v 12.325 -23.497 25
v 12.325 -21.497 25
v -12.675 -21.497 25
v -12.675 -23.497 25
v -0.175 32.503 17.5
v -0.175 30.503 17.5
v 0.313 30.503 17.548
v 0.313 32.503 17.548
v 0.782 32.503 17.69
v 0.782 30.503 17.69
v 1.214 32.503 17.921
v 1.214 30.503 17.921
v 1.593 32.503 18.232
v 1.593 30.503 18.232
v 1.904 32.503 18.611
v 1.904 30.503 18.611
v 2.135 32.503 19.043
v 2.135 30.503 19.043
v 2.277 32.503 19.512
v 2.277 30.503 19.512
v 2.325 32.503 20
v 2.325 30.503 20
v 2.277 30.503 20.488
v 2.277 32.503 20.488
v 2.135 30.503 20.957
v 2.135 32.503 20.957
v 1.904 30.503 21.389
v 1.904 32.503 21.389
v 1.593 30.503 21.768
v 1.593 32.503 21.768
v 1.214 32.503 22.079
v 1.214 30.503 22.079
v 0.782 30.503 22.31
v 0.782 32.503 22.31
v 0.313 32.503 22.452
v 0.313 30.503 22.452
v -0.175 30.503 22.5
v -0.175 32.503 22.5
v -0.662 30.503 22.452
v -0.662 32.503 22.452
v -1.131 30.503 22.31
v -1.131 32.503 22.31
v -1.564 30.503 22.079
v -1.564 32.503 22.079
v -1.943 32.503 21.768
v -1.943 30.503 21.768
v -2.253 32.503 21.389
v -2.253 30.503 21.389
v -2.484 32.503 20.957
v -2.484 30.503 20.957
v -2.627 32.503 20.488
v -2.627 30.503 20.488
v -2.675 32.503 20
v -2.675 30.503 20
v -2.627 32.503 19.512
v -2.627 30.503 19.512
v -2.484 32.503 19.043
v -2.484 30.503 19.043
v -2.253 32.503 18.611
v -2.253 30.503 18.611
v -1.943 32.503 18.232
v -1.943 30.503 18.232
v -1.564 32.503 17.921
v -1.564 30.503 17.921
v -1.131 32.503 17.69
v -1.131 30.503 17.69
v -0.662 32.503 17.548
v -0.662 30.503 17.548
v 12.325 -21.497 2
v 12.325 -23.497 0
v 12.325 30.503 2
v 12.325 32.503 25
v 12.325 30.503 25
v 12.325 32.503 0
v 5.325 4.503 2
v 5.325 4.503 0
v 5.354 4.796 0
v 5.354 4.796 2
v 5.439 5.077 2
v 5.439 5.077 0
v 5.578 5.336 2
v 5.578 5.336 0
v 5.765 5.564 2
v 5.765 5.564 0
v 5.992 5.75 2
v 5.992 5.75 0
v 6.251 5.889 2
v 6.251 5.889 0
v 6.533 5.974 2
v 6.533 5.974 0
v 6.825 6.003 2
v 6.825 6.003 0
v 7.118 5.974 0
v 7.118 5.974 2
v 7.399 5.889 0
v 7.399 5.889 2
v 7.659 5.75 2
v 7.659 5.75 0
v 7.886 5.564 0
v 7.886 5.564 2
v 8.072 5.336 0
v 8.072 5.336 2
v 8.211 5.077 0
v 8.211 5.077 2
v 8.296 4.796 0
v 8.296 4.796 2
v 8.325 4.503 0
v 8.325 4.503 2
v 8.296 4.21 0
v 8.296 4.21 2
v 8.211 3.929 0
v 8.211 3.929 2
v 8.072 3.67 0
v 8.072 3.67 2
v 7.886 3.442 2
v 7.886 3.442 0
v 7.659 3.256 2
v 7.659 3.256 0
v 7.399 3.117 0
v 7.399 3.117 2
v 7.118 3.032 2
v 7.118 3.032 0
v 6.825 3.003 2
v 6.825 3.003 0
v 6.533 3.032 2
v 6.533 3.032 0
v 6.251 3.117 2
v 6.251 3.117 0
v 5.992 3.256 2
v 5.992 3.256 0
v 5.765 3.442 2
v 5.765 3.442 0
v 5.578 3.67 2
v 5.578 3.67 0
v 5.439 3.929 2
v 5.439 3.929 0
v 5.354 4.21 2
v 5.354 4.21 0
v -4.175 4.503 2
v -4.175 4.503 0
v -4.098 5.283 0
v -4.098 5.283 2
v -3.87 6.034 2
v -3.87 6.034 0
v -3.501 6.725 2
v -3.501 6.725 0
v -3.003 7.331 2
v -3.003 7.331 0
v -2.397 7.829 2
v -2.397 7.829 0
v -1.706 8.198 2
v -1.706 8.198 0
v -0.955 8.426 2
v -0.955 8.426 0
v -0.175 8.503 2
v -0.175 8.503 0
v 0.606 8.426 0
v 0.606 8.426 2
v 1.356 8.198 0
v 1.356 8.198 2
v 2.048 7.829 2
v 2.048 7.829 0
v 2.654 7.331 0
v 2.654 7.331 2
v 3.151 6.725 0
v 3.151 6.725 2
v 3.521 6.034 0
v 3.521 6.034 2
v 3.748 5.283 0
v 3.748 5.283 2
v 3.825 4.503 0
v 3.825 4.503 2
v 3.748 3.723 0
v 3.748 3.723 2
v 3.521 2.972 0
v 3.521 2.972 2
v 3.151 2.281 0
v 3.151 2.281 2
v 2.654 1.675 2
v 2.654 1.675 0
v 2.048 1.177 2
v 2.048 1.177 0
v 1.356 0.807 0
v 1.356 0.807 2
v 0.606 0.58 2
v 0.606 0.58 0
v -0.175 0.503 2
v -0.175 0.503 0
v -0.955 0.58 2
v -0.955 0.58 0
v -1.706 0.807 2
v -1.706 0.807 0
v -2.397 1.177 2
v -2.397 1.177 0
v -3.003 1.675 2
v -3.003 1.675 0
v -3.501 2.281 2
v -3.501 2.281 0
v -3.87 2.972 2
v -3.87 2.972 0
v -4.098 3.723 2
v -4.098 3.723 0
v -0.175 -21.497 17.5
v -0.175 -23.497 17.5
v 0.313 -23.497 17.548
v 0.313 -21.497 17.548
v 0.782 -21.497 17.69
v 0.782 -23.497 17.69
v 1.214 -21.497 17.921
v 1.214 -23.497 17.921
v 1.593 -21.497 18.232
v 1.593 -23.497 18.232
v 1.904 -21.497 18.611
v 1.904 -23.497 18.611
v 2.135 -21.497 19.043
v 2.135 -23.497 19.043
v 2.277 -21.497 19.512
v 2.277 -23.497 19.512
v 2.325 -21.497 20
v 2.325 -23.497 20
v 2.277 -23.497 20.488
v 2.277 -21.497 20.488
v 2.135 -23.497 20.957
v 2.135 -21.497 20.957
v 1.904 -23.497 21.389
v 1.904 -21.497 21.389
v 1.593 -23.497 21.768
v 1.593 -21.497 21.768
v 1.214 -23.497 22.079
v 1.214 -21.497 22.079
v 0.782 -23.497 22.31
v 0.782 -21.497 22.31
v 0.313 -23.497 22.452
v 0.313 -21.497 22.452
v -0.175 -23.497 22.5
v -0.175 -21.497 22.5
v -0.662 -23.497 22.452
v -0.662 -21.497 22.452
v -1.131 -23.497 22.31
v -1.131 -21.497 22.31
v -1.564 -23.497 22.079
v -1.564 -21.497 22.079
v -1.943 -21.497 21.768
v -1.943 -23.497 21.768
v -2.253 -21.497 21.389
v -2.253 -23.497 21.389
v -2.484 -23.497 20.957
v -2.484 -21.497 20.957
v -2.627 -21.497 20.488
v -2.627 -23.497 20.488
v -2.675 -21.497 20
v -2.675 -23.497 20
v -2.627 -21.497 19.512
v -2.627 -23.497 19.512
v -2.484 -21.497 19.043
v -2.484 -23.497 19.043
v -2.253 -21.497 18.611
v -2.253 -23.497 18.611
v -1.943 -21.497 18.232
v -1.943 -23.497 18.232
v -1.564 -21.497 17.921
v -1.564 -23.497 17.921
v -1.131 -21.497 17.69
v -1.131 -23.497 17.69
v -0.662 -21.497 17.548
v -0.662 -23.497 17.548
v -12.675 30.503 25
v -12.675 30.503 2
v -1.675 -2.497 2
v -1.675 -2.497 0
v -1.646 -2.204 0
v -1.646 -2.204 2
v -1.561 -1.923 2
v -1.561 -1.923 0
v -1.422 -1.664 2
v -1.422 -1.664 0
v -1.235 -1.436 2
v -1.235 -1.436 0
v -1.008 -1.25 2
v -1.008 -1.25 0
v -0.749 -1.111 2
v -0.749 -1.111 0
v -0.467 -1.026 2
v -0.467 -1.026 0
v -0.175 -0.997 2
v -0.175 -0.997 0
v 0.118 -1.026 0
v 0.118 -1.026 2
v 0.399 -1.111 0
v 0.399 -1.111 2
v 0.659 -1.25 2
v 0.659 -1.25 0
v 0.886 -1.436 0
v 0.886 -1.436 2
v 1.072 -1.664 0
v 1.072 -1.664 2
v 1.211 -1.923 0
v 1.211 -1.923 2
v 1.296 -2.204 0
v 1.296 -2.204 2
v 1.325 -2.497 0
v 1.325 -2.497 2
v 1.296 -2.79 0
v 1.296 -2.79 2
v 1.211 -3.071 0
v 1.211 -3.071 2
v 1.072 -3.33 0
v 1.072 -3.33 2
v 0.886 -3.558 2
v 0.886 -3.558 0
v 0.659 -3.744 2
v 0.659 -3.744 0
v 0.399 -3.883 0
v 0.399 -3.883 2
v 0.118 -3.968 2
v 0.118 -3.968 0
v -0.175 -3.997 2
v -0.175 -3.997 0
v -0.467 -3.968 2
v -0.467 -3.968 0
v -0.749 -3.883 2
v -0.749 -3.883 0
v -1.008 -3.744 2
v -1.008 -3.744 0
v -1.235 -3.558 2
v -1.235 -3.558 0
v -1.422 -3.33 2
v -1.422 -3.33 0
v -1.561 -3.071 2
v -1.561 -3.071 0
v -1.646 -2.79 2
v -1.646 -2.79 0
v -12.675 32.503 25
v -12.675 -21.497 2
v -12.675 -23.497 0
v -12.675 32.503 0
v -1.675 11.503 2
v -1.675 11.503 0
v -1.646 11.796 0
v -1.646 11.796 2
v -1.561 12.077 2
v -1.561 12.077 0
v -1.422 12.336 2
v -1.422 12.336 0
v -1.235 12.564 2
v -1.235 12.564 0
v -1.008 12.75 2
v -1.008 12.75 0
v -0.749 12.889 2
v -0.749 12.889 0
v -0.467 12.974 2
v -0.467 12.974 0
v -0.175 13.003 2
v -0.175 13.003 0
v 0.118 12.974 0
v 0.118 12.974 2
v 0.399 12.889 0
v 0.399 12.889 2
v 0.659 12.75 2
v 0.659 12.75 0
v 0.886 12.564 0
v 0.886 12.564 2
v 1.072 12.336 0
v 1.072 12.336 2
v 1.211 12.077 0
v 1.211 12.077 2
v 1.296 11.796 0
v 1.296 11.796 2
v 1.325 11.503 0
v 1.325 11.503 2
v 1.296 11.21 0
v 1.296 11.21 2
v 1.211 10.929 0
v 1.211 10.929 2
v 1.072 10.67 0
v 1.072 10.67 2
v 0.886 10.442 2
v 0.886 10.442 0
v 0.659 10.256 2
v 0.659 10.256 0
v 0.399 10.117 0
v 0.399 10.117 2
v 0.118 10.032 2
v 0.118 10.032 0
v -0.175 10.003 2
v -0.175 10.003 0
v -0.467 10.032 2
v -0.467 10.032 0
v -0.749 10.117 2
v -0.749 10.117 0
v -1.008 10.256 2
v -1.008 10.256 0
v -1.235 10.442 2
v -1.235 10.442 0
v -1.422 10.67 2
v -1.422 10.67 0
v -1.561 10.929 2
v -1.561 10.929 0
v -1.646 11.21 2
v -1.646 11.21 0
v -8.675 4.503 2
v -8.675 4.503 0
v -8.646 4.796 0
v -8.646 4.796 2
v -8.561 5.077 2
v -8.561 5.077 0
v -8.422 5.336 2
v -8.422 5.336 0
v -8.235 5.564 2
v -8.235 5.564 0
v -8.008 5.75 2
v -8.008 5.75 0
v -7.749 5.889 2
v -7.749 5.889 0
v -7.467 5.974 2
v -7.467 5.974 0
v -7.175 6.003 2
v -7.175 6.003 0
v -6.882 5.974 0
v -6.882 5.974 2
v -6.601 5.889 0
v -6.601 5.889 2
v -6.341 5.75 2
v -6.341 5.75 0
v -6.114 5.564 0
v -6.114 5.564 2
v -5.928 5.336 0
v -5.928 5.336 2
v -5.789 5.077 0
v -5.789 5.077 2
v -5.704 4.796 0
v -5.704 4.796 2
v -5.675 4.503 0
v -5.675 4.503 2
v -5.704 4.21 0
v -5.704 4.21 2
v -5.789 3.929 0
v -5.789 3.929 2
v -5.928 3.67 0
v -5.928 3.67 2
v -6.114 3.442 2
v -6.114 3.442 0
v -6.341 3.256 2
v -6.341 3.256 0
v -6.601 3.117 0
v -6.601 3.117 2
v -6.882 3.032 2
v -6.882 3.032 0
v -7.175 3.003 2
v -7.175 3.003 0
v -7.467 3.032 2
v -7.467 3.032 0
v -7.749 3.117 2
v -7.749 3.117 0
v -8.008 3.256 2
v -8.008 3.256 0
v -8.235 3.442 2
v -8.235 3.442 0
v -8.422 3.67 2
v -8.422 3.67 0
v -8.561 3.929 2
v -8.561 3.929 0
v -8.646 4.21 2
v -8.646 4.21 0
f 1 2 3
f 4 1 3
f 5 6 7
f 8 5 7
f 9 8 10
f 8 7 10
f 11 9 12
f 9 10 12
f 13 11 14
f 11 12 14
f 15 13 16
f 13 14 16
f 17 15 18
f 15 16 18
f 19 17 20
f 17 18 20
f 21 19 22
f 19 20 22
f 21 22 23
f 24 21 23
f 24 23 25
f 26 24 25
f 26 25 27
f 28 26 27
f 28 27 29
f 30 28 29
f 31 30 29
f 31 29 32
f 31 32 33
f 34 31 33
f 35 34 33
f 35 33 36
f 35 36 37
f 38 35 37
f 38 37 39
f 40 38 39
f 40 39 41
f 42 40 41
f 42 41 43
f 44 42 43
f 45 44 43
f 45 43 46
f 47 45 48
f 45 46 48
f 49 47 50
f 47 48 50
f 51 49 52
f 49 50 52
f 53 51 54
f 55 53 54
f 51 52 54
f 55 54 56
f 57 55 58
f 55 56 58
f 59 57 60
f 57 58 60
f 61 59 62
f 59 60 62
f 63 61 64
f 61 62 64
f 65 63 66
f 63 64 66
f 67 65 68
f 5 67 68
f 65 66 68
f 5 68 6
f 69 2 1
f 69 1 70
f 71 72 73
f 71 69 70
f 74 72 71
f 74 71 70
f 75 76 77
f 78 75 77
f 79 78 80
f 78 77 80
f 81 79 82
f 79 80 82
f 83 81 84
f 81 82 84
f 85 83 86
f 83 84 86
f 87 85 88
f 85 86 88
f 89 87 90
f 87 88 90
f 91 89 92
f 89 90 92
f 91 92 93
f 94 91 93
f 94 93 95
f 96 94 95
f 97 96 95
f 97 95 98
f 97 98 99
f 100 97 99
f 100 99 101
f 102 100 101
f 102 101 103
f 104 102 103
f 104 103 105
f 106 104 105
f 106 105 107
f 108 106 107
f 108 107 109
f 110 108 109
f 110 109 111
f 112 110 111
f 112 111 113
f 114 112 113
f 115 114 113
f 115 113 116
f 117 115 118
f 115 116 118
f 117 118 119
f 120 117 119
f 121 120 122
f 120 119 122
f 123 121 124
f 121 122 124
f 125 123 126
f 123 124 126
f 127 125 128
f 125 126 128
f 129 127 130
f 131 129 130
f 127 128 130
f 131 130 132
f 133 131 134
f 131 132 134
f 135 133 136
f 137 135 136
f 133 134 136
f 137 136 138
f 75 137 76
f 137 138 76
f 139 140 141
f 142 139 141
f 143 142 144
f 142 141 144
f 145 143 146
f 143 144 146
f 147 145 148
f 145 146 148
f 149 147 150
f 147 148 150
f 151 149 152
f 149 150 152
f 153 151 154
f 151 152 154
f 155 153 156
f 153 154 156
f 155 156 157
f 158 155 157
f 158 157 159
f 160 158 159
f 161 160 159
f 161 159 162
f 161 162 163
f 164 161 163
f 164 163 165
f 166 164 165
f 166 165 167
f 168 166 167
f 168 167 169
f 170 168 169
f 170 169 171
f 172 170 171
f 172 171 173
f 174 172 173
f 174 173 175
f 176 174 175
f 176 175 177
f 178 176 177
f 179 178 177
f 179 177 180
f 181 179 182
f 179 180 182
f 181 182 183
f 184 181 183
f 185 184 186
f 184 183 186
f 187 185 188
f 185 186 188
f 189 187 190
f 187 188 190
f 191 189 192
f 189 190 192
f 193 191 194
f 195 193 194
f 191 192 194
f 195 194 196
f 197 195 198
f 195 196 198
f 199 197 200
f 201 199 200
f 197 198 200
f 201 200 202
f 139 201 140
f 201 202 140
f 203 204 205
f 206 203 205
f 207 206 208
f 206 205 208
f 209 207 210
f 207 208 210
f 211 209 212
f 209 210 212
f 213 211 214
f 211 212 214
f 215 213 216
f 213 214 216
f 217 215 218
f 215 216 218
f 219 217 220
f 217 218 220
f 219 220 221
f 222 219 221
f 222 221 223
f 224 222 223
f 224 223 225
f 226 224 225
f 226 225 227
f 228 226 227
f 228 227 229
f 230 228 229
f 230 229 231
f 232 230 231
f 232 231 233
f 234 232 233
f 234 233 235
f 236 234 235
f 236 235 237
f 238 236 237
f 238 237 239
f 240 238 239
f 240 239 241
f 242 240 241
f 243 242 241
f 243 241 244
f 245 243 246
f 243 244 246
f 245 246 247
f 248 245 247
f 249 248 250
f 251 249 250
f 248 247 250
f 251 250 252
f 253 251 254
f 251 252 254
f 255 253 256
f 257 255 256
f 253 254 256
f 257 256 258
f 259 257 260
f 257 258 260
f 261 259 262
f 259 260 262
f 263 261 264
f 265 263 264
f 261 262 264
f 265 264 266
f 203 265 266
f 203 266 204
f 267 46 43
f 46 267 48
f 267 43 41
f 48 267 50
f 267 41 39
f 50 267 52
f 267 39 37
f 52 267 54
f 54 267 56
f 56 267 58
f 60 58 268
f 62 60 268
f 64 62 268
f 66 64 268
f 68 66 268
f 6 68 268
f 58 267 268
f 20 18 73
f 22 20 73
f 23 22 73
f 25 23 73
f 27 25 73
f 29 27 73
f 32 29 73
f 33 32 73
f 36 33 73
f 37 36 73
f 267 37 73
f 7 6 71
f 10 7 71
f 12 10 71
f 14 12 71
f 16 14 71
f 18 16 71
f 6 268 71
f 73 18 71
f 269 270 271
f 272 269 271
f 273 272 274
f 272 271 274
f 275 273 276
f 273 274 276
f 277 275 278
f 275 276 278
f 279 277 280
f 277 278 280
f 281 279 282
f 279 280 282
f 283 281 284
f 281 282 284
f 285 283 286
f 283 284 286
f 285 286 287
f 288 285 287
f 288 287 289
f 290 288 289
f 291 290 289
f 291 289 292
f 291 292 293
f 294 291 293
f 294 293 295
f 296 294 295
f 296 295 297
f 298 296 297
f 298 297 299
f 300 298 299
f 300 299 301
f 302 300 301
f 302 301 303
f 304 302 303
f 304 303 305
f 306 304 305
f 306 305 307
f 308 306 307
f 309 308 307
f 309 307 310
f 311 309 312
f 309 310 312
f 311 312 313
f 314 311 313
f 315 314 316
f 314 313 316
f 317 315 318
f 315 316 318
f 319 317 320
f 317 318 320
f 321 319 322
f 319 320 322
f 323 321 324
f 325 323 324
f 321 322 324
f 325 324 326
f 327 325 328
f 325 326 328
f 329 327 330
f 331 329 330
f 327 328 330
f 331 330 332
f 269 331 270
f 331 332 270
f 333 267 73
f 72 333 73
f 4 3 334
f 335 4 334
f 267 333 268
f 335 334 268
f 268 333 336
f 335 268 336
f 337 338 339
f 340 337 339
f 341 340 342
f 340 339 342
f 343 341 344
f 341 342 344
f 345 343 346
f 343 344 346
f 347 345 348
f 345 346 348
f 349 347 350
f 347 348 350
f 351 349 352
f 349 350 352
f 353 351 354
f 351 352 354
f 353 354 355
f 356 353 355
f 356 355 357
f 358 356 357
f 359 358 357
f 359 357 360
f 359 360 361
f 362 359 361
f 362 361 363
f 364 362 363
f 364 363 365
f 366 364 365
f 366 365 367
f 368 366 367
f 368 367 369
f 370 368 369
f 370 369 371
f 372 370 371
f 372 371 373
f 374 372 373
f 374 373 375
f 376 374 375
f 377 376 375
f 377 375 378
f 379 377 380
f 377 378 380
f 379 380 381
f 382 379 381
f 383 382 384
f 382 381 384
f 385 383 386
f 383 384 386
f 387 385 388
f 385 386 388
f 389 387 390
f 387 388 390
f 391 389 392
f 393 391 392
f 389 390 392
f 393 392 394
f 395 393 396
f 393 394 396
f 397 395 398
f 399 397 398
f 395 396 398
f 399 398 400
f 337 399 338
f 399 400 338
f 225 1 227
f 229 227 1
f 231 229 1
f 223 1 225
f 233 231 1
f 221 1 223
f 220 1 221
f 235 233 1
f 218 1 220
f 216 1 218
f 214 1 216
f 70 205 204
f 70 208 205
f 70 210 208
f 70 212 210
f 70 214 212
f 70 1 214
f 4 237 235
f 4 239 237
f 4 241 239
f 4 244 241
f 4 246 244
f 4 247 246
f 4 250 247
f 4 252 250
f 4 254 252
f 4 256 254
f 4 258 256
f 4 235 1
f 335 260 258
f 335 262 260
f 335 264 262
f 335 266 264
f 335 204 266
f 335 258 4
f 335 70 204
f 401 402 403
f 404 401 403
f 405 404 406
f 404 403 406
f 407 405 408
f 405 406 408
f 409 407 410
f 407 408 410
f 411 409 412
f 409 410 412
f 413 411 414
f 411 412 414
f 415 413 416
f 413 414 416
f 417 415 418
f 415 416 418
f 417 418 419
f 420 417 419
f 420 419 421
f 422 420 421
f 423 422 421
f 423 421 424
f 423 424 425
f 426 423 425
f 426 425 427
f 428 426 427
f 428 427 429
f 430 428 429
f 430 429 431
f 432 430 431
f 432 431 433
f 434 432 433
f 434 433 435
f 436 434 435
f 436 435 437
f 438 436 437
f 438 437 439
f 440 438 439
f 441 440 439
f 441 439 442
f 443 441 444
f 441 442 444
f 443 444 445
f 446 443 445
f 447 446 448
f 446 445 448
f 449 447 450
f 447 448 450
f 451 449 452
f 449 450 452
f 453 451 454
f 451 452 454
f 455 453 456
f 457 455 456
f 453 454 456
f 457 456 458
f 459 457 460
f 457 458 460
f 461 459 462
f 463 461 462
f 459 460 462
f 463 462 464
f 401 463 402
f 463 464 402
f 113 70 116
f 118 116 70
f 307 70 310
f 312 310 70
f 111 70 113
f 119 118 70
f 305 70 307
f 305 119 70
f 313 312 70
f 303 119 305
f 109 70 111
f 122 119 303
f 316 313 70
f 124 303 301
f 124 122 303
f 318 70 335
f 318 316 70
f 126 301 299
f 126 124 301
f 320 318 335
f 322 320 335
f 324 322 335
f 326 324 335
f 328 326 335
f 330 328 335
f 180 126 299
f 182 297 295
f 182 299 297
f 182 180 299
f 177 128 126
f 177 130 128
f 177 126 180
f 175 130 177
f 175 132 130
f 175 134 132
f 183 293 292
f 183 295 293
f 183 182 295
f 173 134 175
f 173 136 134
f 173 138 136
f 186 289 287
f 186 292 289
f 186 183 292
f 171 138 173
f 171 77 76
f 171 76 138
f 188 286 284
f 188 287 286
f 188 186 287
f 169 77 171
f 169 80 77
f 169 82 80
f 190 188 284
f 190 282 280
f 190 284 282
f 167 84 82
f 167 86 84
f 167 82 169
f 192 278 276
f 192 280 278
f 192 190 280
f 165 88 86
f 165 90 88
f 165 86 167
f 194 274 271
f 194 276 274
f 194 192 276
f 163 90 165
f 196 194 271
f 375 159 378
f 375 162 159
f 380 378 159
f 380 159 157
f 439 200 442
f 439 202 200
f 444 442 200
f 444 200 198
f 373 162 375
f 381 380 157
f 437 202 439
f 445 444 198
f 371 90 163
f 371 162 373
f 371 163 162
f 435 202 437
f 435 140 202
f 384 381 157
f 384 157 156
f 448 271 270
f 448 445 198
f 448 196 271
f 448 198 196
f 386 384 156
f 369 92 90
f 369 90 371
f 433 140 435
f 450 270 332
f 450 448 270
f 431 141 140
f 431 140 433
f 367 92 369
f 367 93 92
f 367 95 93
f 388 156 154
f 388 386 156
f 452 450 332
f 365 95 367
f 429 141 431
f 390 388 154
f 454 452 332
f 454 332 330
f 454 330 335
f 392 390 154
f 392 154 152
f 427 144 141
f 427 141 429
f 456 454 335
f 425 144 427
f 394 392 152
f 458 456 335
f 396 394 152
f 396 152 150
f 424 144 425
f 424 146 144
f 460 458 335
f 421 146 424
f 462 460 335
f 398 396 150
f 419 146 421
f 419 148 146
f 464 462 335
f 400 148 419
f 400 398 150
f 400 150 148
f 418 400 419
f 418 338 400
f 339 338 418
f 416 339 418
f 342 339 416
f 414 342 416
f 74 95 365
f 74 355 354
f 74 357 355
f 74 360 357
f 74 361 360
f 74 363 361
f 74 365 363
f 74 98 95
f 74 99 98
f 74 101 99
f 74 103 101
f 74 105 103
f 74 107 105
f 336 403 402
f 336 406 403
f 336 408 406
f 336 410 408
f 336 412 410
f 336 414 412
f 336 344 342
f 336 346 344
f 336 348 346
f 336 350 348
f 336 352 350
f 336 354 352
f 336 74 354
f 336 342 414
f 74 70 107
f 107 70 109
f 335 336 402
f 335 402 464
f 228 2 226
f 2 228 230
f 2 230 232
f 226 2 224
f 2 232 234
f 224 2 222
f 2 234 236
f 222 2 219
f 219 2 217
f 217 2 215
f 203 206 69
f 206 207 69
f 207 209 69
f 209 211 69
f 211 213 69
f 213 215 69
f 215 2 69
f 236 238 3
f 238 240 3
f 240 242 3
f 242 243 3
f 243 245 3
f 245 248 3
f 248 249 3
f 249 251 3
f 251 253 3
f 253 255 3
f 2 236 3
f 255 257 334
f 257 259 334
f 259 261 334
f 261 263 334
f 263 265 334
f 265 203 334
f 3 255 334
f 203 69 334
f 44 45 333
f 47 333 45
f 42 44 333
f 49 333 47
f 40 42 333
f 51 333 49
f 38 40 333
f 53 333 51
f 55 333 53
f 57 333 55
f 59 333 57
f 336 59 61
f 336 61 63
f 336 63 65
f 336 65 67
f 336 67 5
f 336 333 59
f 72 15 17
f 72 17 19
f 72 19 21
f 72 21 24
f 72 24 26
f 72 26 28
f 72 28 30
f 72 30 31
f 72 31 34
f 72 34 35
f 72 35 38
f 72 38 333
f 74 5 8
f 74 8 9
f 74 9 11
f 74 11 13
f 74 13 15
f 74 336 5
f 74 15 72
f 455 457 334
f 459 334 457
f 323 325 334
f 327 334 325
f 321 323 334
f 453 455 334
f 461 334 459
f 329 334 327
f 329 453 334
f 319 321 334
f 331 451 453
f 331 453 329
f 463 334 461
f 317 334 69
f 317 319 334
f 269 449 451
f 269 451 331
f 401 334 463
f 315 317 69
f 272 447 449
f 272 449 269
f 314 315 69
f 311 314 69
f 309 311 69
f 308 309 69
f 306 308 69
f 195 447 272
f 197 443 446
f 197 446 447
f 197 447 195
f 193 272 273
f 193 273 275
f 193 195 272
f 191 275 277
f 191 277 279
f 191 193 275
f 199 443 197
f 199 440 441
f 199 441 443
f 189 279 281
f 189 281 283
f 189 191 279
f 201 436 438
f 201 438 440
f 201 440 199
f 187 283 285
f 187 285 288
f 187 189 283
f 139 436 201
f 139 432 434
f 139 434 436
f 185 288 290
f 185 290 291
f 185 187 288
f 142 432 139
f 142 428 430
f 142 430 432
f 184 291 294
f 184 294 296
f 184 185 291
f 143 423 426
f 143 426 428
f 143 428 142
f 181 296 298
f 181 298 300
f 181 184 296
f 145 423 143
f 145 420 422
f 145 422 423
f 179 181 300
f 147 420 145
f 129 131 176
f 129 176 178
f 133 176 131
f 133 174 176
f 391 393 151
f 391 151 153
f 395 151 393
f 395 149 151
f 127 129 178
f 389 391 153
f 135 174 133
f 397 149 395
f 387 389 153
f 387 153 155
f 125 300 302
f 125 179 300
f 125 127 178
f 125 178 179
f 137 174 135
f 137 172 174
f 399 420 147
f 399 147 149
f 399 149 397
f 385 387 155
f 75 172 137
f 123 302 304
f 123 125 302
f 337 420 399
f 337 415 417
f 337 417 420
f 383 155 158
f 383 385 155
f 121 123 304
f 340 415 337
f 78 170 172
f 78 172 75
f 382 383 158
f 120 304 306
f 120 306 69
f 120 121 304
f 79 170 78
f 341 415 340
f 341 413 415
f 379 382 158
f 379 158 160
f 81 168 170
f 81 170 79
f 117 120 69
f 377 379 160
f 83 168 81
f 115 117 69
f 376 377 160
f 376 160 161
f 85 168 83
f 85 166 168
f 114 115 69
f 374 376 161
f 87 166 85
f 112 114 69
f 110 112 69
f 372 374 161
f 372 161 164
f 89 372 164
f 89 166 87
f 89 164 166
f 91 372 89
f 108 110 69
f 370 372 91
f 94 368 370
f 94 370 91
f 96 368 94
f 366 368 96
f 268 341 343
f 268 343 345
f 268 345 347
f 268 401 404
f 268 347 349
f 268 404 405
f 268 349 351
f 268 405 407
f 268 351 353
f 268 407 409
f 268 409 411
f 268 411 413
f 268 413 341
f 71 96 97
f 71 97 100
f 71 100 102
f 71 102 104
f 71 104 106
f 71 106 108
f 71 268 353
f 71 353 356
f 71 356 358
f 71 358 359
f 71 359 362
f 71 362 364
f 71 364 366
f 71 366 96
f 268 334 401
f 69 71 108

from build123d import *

# Parameters (mm, degrees)
SKETCH1_W           = 25
SKETCH1_H           = 52
BOSS_EXTRUDE1_DEPTH = 2
SKETCH2_W           = 25
SKETCH2_H           = 25
BOSS_EXTRUDE2_DEPTH = 2
SKETCH3_W           = 25
SKETCH3_H           = 25
BOSS_EXTRUDE3_DEPTH = 2
SKETCH5_R           = 4
CUT_EXTRUDE2_DEPTH  = 21
SKETCH6_R           = 1.5
CUT_EXTRUDE3_DEPTH  = 21
SKETCH7_R           = 2.5
CUT_EXTRUDE4_DEPTH  = 81


with BuildPart() as part:
    # Sketch1 → Boss-Extrude1 (new body)
    with BuildSketch(Plane.XY):
        with Locations((-0.174770451, 4.502942624)):
            Rectangle(SKETCH1_W, SKETCH1_H)
    extrude(amount=BOSS_EXTRUDE1_DEPTH)

    # Sketch2 → Boss-Extrude2 (add)
    with BuildSketch(Plane(origin=(0, 30.502942624, 0), x_dir=(1, 0, 0), z_dir=(0, 1, 0))):
        with Locations((-0.174770451, -12.5)):
            Rectangle(SKETCH2_W, SKETCH2_H)
    extrude(amount=BOSS_EXTRUDE2_DEPTH)

    # Sketch3 → Boss-Extrude3 (add)
    with BuildSketch(Plane(origin=(0, -21.497057376, 0), x_dir=(-1, 0, 0), z_dir=(0, -1, 0))):
        with Locations((0.174770451, -12.5)):
            Rectangle(SKETCH3_W, SKETCH3_H)
    extrude(amount=BOSS_EXTRUDE3_DEPTH)

    # Sketch5 → Cut-Extrude2 (cut)
    with BuildSketch(Plane(origin=(0, 0, 0), x_dir=(-1, 0, 0), z_dir=(0, 0, -1))):
        with Locations((0.174770451, 4.502942624)):
            Circle(SKETCH5_R)
    extrude(amount=-CUT_EXTRUDE2_DEPTH, mode=Mode.SUBTRACT)

    # Sketch6 → Cut-Extrude3 (cut)
    with BuildSketch(Plane(origin=(0, 0, 0), x_dir=(-1, 0, 0), z_dir=(0, 0, -1))):
        with Locations((7.174770451, 4.502942624)):
            Circle(SKETCH6_R)
        with Locations((0.174770451, -2.497057376)):
            Circle(SKETCH6_R)
        with Locations((-6.825229549, 4.502942624)):
            Circle(SKETCH6_R)
        with Locations((0.174770451, 11.502942624)):
            Circle(SKETCH6_R)
    extrude(amount=-CUT_EXTRUDE3_DEPTH, mode=Mode.SUBTRACT)

    # Sketch7 → Cut-Extrude4 (cut)
    with BuildSketch(Plane(origin=(0, -23.497057376, 0), x_dir=(-1, 0, 0), z_dir=(0, -1, 0))):
        with Locations(Location((0.174770451, -20, 0), (0, 0, 90))):
            Circle(SKETCH7_R)
    extrude(amount=-CUT_EXTRUDE4_DEPTH, mode=Mode.SUBTRACT)


solid = part.part
